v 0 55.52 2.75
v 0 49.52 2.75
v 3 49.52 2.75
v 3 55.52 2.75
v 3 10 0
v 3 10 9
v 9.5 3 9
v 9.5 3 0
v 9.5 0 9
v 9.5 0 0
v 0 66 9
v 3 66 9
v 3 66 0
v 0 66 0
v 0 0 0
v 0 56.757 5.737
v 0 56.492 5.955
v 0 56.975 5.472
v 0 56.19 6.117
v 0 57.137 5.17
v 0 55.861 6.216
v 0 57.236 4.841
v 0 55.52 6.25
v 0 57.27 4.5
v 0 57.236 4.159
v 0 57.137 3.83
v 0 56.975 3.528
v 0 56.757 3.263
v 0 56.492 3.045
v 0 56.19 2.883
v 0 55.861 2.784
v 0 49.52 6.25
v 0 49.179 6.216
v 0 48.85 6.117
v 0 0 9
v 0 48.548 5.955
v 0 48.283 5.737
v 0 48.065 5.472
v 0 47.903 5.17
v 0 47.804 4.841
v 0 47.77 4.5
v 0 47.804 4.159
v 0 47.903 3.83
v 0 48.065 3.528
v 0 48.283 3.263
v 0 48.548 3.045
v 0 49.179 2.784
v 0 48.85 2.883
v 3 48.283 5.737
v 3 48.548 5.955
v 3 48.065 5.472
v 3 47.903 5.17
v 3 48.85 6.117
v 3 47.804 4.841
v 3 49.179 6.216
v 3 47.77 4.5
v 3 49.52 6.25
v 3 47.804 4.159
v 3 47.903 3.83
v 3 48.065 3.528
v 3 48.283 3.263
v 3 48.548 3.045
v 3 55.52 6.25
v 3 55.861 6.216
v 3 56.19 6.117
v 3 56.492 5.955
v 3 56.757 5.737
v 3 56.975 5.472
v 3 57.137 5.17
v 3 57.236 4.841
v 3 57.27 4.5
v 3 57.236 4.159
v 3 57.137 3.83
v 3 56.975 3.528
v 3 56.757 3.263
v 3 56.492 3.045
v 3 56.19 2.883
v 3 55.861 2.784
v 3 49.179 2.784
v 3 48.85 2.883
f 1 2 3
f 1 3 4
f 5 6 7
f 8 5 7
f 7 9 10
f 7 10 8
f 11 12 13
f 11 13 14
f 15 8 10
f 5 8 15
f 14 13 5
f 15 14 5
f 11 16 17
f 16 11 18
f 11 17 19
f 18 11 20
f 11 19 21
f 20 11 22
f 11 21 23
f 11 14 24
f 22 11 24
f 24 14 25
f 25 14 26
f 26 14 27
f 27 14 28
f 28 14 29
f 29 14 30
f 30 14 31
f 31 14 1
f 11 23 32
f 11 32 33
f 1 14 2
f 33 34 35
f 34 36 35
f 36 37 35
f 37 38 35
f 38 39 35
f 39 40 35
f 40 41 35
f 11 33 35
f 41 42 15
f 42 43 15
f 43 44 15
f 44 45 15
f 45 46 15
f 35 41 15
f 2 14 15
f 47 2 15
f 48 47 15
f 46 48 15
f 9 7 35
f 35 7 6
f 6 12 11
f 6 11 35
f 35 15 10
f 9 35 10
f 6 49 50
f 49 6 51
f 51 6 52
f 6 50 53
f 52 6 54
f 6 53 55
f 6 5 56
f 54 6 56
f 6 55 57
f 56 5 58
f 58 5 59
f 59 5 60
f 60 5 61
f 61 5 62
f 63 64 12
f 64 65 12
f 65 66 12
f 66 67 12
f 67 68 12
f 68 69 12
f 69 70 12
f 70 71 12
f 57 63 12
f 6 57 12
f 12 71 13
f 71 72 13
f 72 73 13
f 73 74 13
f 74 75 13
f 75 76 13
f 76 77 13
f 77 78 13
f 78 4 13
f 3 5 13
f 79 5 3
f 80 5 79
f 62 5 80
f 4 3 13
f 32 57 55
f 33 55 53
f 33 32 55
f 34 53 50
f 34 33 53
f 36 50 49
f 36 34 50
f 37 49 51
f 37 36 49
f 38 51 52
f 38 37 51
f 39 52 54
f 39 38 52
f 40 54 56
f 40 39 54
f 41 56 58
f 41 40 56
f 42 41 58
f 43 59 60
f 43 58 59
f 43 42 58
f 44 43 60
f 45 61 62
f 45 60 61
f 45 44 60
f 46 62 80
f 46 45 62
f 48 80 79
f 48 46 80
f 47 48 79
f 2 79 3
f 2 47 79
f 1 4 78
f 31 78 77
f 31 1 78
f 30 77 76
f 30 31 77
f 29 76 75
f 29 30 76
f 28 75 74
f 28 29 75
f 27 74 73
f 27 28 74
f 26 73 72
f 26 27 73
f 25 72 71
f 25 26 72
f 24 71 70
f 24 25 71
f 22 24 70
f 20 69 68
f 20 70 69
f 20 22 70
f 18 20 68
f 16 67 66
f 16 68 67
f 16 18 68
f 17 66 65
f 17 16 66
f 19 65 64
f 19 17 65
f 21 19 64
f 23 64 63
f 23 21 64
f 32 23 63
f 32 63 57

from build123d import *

# Parameters (mm, degrees)
EXTRUDE_1_DEPTH     = 9
CUT_EXTRUDE_2_DEPTH = 68.284842275
EXTRUDE_2_DEPTH     = 9


with BuildPart() as part:
    # Эскиз1 → Бобышка-Вытянуть1 (new body)
    with BuildSketch(Plane.XY):
        Polygon((0, 0), (9.5, 0), (9.5, 3), (3, 3), (3, 66), (0, 66), align=None)
    extrude(amount=EXTRUDE_1_DEPTH)

    # Эскиз4 → Вырез-Вытянуть2 (cut, through all)
    with BuildSketch(Plane.ZY):
        with BuildLine():
            Line((6.25, 55.52), (6.25, 49.52))
            ThreePointArc((6.25, 49.52), (4.5, 47.77), (2.75, 49.52))
            Line((2.75, 49.52), (2.75, 55.52))
            ThreePointArc((2.75, 55.52), (4.5, 57.27), (6.25, 55.52))
        make_face()
    extrude(amount=-CUT_EXTRUDE_2_DEPTH, mode=Mode.SUBTRACT)

    # Эскиз5 → Бобышка-Вытянуть2 (add, through all)
    with BuildSketch(Plane.XY.offset(9)):
        Polygon((3, 3), (3, 10), (9.5, 3), align=None)
    extrude(amount=-EXTRUDE_2_DEPTH)


solid = part.part
